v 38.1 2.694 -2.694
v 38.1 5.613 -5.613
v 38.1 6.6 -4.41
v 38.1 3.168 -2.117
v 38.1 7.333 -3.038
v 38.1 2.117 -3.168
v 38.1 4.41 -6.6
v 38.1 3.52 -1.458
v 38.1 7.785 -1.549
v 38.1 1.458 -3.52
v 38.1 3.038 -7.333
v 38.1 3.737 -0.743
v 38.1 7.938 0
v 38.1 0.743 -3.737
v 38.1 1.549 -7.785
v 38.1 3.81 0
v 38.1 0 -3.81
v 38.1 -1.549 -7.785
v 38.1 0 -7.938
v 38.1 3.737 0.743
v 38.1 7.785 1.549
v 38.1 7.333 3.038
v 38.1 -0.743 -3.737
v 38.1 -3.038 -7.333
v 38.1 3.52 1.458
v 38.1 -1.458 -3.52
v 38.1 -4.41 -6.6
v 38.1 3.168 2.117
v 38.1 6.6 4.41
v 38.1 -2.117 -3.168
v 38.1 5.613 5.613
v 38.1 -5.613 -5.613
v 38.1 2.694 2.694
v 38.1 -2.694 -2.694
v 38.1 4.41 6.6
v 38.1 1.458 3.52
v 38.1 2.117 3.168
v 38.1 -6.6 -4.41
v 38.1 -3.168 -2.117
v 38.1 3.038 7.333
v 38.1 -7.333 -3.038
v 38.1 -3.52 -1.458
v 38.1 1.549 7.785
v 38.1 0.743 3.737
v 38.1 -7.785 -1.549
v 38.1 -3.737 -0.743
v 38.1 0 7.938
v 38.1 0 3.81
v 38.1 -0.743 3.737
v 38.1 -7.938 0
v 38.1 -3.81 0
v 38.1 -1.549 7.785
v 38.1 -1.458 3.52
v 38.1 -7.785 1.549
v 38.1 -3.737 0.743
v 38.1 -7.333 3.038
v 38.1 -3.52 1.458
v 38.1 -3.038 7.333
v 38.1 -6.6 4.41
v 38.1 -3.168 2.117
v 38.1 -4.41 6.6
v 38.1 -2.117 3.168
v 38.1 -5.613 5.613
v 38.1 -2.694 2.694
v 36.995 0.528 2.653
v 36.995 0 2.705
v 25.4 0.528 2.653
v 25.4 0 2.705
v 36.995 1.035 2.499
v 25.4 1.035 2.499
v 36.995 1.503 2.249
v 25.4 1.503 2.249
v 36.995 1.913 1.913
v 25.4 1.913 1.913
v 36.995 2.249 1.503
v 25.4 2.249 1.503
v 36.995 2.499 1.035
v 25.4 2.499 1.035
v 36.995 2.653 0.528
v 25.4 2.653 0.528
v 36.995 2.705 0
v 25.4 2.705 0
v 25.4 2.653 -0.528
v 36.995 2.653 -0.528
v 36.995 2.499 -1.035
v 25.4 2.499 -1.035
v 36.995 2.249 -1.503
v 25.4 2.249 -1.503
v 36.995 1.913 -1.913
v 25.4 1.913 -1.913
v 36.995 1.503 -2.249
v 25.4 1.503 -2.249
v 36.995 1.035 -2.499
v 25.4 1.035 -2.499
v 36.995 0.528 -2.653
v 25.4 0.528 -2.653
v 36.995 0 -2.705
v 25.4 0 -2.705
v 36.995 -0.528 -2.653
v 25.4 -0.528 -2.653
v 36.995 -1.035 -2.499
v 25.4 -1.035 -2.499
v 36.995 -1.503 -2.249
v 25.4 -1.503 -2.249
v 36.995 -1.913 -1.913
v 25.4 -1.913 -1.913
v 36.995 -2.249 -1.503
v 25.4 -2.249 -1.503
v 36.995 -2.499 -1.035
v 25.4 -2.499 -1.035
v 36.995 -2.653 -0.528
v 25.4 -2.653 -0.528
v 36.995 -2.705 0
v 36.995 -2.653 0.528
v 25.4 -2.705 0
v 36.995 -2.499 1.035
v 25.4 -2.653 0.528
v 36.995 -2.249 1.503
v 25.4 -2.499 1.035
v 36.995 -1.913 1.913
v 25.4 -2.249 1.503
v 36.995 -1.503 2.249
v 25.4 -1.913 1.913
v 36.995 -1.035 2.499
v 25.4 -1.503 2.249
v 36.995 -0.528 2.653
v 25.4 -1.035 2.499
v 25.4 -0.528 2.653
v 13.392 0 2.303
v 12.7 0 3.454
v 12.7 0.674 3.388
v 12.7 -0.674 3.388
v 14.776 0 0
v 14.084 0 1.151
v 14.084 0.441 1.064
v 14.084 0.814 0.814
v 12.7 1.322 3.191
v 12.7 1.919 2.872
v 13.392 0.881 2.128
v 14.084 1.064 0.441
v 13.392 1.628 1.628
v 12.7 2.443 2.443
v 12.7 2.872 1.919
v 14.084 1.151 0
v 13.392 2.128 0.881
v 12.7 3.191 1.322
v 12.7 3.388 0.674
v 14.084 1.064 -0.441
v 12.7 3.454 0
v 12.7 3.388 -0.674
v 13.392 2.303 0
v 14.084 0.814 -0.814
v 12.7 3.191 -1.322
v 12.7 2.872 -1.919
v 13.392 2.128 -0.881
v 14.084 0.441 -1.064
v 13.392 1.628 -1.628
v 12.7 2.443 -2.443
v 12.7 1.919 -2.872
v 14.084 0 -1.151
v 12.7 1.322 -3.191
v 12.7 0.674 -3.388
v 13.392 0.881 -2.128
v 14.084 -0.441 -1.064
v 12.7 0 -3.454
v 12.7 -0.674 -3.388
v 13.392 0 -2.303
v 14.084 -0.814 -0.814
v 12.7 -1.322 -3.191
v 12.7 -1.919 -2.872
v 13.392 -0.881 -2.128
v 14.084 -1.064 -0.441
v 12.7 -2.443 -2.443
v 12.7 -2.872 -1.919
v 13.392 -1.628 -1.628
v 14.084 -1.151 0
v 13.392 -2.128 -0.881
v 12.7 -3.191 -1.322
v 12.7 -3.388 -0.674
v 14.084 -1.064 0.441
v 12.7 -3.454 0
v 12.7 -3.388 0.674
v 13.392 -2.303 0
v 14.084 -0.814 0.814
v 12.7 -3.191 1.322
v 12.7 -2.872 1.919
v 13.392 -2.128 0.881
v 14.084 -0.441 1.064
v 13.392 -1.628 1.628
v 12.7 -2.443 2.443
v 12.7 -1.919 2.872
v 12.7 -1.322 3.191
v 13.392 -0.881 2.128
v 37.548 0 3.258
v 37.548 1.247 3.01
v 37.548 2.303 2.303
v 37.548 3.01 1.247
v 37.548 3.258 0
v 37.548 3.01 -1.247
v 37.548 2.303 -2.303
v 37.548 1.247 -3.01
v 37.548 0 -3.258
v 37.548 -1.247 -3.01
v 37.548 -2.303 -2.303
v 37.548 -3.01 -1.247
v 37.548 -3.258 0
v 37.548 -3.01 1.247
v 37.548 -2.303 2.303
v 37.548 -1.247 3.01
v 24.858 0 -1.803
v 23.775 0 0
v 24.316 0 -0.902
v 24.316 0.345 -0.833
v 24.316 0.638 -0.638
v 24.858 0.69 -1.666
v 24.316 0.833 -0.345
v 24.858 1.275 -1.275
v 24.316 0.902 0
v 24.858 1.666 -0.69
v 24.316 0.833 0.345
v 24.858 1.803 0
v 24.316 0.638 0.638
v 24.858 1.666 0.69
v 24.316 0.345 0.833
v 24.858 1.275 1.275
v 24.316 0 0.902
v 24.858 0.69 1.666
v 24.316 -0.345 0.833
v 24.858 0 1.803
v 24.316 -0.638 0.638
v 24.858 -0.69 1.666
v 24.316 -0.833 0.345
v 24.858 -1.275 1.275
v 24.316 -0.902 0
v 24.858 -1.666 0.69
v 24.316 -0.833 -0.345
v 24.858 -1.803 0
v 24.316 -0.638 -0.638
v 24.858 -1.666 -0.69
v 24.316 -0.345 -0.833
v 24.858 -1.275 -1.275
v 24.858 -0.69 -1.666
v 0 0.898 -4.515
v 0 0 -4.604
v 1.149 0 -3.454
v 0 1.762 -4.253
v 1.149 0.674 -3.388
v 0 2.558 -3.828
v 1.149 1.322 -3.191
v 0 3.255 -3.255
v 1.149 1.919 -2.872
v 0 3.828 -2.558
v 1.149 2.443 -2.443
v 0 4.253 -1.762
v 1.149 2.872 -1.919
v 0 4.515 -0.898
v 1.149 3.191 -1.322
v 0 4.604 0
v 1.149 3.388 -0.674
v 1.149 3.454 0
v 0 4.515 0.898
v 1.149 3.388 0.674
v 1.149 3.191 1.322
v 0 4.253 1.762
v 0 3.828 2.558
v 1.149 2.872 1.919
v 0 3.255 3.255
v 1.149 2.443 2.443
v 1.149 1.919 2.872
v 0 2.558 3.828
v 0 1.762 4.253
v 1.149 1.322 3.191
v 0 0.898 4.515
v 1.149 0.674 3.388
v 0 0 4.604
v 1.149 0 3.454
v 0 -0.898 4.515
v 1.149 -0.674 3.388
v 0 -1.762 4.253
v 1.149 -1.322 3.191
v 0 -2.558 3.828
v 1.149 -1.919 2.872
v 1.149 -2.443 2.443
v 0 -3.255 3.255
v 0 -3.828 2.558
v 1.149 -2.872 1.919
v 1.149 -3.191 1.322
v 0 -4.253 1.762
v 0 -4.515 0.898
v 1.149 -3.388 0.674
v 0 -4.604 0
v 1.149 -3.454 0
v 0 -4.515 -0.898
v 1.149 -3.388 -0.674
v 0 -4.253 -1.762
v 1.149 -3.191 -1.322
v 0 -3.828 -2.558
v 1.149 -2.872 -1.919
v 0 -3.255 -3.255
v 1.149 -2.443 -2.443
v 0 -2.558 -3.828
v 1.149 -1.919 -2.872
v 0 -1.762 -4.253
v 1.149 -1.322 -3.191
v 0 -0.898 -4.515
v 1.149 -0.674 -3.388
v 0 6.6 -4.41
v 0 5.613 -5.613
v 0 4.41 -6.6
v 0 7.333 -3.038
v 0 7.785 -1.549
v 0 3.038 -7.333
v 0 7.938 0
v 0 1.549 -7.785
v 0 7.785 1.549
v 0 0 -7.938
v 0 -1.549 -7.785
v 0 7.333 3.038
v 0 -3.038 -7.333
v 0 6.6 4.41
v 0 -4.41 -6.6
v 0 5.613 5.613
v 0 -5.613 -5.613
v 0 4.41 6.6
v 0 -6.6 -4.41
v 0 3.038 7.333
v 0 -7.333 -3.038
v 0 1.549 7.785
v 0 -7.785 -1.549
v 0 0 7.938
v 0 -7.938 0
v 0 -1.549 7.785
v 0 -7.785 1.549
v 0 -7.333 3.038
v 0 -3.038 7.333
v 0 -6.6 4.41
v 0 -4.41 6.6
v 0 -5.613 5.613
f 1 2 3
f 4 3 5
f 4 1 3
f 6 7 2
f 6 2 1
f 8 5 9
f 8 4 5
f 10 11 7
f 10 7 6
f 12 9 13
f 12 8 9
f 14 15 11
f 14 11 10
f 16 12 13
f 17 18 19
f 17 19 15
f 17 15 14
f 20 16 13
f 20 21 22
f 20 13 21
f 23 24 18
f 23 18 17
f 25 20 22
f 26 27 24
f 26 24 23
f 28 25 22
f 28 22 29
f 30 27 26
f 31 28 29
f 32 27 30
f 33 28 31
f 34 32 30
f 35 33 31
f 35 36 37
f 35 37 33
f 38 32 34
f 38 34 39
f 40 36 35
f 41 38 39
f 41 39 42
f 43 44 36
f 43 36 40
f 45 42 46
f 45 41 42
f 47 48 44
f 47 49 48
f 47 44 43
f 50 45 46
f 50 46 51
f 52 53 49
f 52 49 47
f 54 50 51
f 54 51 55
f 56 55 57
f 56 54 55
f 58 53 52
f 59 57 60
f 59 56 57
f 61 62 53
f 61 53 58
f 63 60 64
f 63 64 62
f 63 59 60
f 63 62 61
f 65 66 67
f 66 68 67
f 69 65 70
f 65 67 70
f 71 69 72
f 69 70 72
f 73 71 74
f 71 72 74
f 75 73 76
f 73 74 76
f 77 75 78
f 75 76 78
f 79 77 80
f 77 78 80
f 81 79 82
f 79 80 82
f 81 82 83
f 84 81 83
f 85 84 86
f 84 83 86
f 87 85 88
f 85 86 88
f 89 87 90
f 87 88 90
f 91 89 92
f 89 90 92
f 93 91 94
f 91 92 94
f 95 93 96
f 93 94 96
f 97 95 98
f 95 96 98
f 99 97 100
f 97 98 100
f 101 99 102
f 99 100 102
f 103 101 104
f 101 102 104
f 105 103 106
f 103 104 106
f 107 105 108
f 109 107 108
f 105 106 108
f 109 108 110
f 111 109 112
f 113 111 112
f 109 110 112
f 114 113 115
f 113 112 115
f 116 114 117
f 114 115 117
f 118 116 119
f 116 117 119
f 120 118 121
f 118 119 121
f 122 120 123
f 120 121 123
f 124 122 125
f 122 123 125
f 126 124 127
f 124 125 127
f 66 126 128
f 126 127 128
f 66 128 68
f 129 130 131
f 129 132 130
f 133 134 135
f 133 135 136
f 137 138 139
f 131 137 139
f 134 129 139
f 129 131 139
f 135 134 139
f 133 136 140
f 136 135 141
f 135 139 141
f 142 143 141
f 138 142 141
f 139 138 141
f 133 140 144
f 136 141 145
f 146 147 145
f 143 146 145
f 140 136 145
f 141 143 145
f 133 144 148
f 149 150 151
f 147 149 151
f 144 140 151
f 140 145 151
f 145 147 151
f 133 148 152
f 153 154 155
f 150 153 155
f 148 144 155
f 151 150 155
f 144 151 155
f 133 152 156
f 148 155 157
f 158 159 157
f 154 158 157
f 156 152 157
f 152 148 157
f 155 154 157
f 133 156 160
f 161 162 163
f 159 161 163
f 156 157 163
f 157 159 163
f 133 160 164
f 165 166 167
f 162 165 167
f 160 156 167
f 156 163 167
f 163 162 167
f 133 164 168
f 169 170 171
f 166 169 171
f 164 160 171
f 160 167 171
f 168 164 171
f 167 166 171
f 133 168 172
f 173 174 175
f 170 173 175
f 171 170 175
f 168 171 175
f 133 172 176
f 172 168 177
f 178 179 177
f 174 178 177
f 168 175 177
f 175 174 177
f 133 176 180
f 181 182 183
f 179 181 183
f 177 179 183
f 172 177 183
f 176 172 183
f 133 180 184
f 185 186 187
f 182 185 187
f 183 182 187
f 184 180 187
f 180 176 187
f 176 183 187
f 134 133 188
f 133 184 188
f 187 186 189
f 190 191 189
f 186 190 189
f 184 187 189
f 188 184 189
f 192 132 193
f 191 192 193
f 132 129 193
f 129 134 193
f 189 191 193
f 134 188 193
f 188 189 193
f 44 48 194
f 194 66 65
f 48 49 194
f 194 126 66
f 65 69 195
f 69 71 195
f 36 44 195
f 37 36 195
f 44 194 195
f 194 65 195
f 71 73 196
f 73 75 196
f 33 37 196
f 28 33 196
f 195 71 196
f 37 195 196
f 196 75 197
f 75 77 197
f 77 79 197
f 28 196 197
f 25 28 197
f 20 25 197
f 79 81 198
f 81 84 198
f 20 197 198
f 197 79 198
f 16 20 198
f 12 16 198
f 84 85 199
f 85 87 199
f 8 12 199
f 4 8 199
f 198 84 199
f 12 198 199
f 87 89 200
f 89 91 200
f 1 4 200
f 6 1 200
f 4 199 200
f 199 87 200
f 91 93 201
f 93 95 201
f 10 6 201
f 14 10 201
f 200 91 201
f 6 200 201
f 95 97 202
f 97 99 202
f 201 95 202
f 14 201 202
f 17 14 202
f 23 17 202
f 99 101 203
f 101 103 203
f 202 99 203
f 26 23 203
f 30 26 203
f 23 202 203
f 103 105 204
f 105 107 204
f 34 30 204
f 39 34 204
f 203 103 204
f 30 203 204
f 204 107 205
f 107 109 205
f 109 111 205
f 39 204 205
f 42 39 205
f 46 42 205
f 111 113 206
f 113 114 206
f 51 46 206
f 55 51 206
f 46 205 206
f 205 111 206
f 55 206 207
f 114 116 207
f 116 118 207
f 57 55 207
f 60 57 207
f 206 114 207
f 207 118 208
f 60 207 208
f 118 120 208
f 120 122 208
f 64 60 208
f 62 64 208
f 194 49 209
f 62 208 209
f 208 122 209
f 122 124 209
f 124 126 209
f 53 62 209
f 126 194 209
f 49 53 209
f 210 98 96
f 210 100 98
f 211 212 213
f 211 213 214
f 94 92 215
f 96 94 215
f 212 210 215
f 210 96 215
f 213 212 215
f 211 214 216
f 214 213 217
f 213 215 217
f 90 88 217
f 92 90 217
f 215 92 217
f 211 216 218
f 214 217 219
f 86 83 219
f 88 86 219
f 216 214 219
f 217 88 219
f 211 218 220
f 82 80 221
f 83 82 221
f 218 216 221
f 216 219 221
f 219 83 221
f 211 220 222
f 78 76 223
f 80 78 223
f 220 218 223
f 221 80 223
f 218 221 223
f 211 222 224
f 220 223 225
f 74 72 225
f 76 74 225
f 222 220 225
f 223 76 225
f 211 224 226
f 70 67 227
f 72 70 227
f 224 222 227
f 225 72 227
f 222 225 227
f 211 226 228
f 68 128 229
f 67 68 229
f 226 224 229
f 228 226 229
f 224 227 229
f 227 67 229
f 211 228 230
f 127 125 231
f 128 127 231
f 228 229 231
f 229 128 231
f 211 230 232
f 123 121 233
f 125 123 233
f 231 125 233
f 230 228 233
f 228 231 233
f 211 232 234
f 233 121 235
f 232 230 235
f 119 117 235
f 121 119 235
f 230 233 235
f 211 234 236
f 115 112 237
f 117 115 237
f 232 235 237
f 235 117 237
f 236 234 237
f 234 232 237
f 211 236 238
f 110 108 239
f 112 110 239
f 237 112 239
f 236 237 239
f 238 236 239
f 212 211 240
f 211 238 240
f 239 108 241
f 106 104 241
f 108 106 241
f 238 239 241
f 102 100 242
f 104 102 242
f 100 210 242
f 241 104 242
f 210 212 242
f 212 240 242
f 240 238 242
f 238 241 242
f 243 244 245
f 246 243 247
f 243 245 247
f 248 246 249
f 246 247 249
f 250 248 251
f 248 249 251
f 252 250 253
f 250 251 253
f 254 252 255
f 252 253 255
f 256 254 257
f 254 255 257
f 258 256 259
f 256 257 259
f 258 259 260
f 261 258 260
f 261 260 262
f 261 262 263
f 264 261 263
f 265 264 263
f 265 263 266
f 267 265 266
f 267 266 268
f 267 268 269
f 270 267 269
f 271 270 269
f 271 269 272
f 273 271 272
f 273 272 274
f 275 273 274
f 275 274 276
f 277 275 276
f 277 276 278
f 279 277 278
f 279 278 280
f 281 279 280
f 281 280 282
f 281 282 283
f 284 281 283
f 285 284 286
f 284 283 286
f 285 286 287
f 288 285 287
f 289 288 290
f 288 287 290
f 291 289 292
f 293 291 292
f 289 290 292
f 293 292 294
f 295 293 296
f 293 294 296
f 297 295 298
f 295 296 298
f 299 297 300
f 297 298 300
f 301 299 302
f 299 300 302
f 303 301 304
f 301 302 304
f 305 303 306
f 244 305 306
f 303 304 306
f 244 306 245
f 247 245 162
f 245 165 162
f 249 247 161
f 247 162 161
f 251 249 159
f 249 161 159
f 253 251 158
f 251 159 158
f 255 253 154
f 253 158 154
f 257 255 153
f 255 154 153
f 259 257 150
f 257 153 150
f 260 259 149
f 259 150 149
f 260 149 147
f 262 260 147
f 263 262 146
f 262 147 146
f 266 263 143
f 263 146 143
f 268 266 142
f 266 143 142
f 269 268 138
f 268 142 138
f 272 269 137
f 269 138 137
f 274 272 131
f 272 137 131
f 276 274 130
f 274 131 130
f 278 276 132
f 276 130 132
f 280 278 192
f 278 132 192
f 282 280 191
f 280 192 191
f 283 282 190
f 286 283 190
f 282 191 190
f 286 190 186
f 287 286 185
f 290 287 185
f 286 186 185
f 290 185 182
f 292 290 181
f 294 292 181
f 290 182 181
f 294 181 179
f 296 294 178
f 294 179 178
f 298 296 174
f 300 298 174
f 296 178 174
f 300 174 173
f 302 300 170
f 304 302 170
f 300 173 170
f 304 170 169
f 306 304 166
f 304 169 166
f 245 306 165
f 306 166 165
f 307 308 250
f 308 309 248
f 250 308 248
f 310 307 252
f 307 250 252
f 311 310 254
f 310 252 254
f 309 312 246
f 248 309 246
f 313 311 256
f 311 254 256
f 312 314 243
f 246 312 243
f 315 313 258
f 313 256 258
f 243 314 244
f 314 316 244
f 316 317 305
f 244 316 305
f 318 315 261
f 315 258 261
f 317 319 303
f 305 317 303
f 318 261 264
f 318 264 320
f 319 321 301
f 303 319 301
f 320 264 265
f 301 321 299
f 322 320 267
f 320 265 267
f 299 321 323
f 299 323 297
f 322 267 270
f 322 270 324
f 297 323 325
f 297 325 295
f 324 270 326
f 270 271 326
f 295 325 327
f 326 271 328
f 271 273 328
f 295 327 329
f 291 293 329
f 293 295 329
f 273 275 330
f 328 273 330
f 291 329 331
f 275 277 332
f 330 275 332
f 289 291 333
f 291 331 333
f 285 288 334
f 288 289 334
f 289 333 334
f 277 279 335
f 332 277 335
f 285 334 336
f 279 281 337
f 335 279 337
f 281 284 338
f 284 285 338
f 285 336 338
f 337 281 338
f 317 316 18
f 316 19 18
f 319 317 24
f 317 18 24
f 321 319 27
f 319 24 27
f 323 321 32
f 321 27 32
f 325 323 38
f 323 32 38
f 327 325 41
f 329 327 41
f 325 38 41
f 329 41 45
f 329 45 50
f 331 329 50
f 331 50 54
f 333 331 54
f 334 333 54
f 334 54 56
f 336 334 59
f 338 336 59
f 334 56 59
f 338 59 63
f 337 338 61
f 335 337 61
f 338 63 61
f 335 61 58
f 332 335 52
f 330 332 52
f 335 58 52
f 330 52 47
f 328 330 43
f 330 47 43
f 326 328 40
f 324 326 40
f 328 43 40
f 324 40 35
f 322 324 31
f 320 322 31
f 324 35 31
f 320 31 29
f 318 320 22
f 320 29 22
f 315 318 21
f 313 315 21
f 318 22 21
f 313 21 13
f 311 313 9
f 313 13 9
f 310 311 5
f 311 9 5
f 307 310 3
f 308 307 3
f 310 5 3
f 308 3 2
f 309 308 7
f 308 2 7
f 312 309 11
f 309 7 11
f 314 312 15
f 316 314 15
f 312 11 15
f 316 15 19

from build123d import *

# Parameters (mm, degrees)
SKETCH1_W                         = 38.1
SKETCH1_H                         = 7.9375
F_1_4_28_TAPPED_HOLE1_D           = 5.4102
F_1_4_28_TAPPED_HOLE1_DEPTH       = 12.7
F_1_4_28_TAPPED_HOLE1_CSINK_D     = 7.62
F_1_4_28_TAPPED_HOLE1_CSINK_ANGLE = 90
F_1_4_28_TAPPED_HOLE1_TIP         = 1.625388061
F_7_16_28_TAPPED_HOLE_D           = 6.9088
F_7_16_28_TAPPED_HOLE_DEPTH       = 12.7
F_7_16_28_TAPPED_HOLE_CSINK_D     = 9.2075
F_7_16_28_TAPPED_HOLE_CSINK_ANGLE = 90
F_7_16_28_TAPPED_HOLE_TIP         = 2.075612922


with BuildPart() as part:
    # Sketch1 → Revolve1 (revolve)
    with BuildSketch(Plane.XY, mode=Mode.PRIVATE) as revolve1_sk:
        with Locations((19.05, 3.96875)):
            Rectangle(SKETCH1_W, SKETCH1_H)
    revolve(revolve1_sk.sketch.rotate(Axis((0, 0, 0), (-1, 0, 0)), 90), axis=Axis((0, 0, 0), (-1, 0, 0)))

    # 1/4-28 Tapped Hole1
    with Locations(Plane(origin=(38.1, 0, 0), x_dir=(0, 0, -1), z_dir=(1, 0, 0))):
        with Locations((0, 0)):
            CounterSinkHole(F_1_4_28_TAPPED_HOLE1_D / 2, F_1_4_28_TAPPED_HOLE1_CSINK_D / 2, depth=F_1_4_28_TAPPED_HOLE1_DEPTH, counter_sink_angle=F_1_4_28_TAPPED_HOLE1_CSINK_ANGLE)
            with Locations((0, 0, -(F_1_4_28_TAPPED_HOLE1_DEPTH + F_1_4_28_TAPPED_HOLE1_TIP / 2))):  # 118° drill point
                Cone(0, F_1_4_28_TAPPED_HOLE1_D / 2, F_1_4_28_TAPPED_HOLE1_TIP, mode=Mode.SUBTRACT)

    # 7/16-28 Tapped Hole
    with Locations(Plane.ZY):
        with Locations((0, 0)):
            CounterSinkHole(F_7_16_28_TAPPED_HOLE_D / 2, F_7_16_28_TAPPED_HOLE_CSINK_D / 2, depth=F_7_16_28_TAPPED_HOLE_DEPTH, counter_sink_angle=F_7_16_28_TAPPED_HOLE_CSINK_ANGLE)
            with Locations((0, 0, -(F_7_16_28_TAPPED_HOLE_DEPTH + F_7_16_28_TAPPED_HOLE_TIP / 2))):  # 118° drill point
                Cone(0, F_7_16_28_TAPPED_HOLE_D / 2, F_7_16_28_TAPPED_HOLE_TIP, mode=Mode.SUBTRACT)


solid = part.part
